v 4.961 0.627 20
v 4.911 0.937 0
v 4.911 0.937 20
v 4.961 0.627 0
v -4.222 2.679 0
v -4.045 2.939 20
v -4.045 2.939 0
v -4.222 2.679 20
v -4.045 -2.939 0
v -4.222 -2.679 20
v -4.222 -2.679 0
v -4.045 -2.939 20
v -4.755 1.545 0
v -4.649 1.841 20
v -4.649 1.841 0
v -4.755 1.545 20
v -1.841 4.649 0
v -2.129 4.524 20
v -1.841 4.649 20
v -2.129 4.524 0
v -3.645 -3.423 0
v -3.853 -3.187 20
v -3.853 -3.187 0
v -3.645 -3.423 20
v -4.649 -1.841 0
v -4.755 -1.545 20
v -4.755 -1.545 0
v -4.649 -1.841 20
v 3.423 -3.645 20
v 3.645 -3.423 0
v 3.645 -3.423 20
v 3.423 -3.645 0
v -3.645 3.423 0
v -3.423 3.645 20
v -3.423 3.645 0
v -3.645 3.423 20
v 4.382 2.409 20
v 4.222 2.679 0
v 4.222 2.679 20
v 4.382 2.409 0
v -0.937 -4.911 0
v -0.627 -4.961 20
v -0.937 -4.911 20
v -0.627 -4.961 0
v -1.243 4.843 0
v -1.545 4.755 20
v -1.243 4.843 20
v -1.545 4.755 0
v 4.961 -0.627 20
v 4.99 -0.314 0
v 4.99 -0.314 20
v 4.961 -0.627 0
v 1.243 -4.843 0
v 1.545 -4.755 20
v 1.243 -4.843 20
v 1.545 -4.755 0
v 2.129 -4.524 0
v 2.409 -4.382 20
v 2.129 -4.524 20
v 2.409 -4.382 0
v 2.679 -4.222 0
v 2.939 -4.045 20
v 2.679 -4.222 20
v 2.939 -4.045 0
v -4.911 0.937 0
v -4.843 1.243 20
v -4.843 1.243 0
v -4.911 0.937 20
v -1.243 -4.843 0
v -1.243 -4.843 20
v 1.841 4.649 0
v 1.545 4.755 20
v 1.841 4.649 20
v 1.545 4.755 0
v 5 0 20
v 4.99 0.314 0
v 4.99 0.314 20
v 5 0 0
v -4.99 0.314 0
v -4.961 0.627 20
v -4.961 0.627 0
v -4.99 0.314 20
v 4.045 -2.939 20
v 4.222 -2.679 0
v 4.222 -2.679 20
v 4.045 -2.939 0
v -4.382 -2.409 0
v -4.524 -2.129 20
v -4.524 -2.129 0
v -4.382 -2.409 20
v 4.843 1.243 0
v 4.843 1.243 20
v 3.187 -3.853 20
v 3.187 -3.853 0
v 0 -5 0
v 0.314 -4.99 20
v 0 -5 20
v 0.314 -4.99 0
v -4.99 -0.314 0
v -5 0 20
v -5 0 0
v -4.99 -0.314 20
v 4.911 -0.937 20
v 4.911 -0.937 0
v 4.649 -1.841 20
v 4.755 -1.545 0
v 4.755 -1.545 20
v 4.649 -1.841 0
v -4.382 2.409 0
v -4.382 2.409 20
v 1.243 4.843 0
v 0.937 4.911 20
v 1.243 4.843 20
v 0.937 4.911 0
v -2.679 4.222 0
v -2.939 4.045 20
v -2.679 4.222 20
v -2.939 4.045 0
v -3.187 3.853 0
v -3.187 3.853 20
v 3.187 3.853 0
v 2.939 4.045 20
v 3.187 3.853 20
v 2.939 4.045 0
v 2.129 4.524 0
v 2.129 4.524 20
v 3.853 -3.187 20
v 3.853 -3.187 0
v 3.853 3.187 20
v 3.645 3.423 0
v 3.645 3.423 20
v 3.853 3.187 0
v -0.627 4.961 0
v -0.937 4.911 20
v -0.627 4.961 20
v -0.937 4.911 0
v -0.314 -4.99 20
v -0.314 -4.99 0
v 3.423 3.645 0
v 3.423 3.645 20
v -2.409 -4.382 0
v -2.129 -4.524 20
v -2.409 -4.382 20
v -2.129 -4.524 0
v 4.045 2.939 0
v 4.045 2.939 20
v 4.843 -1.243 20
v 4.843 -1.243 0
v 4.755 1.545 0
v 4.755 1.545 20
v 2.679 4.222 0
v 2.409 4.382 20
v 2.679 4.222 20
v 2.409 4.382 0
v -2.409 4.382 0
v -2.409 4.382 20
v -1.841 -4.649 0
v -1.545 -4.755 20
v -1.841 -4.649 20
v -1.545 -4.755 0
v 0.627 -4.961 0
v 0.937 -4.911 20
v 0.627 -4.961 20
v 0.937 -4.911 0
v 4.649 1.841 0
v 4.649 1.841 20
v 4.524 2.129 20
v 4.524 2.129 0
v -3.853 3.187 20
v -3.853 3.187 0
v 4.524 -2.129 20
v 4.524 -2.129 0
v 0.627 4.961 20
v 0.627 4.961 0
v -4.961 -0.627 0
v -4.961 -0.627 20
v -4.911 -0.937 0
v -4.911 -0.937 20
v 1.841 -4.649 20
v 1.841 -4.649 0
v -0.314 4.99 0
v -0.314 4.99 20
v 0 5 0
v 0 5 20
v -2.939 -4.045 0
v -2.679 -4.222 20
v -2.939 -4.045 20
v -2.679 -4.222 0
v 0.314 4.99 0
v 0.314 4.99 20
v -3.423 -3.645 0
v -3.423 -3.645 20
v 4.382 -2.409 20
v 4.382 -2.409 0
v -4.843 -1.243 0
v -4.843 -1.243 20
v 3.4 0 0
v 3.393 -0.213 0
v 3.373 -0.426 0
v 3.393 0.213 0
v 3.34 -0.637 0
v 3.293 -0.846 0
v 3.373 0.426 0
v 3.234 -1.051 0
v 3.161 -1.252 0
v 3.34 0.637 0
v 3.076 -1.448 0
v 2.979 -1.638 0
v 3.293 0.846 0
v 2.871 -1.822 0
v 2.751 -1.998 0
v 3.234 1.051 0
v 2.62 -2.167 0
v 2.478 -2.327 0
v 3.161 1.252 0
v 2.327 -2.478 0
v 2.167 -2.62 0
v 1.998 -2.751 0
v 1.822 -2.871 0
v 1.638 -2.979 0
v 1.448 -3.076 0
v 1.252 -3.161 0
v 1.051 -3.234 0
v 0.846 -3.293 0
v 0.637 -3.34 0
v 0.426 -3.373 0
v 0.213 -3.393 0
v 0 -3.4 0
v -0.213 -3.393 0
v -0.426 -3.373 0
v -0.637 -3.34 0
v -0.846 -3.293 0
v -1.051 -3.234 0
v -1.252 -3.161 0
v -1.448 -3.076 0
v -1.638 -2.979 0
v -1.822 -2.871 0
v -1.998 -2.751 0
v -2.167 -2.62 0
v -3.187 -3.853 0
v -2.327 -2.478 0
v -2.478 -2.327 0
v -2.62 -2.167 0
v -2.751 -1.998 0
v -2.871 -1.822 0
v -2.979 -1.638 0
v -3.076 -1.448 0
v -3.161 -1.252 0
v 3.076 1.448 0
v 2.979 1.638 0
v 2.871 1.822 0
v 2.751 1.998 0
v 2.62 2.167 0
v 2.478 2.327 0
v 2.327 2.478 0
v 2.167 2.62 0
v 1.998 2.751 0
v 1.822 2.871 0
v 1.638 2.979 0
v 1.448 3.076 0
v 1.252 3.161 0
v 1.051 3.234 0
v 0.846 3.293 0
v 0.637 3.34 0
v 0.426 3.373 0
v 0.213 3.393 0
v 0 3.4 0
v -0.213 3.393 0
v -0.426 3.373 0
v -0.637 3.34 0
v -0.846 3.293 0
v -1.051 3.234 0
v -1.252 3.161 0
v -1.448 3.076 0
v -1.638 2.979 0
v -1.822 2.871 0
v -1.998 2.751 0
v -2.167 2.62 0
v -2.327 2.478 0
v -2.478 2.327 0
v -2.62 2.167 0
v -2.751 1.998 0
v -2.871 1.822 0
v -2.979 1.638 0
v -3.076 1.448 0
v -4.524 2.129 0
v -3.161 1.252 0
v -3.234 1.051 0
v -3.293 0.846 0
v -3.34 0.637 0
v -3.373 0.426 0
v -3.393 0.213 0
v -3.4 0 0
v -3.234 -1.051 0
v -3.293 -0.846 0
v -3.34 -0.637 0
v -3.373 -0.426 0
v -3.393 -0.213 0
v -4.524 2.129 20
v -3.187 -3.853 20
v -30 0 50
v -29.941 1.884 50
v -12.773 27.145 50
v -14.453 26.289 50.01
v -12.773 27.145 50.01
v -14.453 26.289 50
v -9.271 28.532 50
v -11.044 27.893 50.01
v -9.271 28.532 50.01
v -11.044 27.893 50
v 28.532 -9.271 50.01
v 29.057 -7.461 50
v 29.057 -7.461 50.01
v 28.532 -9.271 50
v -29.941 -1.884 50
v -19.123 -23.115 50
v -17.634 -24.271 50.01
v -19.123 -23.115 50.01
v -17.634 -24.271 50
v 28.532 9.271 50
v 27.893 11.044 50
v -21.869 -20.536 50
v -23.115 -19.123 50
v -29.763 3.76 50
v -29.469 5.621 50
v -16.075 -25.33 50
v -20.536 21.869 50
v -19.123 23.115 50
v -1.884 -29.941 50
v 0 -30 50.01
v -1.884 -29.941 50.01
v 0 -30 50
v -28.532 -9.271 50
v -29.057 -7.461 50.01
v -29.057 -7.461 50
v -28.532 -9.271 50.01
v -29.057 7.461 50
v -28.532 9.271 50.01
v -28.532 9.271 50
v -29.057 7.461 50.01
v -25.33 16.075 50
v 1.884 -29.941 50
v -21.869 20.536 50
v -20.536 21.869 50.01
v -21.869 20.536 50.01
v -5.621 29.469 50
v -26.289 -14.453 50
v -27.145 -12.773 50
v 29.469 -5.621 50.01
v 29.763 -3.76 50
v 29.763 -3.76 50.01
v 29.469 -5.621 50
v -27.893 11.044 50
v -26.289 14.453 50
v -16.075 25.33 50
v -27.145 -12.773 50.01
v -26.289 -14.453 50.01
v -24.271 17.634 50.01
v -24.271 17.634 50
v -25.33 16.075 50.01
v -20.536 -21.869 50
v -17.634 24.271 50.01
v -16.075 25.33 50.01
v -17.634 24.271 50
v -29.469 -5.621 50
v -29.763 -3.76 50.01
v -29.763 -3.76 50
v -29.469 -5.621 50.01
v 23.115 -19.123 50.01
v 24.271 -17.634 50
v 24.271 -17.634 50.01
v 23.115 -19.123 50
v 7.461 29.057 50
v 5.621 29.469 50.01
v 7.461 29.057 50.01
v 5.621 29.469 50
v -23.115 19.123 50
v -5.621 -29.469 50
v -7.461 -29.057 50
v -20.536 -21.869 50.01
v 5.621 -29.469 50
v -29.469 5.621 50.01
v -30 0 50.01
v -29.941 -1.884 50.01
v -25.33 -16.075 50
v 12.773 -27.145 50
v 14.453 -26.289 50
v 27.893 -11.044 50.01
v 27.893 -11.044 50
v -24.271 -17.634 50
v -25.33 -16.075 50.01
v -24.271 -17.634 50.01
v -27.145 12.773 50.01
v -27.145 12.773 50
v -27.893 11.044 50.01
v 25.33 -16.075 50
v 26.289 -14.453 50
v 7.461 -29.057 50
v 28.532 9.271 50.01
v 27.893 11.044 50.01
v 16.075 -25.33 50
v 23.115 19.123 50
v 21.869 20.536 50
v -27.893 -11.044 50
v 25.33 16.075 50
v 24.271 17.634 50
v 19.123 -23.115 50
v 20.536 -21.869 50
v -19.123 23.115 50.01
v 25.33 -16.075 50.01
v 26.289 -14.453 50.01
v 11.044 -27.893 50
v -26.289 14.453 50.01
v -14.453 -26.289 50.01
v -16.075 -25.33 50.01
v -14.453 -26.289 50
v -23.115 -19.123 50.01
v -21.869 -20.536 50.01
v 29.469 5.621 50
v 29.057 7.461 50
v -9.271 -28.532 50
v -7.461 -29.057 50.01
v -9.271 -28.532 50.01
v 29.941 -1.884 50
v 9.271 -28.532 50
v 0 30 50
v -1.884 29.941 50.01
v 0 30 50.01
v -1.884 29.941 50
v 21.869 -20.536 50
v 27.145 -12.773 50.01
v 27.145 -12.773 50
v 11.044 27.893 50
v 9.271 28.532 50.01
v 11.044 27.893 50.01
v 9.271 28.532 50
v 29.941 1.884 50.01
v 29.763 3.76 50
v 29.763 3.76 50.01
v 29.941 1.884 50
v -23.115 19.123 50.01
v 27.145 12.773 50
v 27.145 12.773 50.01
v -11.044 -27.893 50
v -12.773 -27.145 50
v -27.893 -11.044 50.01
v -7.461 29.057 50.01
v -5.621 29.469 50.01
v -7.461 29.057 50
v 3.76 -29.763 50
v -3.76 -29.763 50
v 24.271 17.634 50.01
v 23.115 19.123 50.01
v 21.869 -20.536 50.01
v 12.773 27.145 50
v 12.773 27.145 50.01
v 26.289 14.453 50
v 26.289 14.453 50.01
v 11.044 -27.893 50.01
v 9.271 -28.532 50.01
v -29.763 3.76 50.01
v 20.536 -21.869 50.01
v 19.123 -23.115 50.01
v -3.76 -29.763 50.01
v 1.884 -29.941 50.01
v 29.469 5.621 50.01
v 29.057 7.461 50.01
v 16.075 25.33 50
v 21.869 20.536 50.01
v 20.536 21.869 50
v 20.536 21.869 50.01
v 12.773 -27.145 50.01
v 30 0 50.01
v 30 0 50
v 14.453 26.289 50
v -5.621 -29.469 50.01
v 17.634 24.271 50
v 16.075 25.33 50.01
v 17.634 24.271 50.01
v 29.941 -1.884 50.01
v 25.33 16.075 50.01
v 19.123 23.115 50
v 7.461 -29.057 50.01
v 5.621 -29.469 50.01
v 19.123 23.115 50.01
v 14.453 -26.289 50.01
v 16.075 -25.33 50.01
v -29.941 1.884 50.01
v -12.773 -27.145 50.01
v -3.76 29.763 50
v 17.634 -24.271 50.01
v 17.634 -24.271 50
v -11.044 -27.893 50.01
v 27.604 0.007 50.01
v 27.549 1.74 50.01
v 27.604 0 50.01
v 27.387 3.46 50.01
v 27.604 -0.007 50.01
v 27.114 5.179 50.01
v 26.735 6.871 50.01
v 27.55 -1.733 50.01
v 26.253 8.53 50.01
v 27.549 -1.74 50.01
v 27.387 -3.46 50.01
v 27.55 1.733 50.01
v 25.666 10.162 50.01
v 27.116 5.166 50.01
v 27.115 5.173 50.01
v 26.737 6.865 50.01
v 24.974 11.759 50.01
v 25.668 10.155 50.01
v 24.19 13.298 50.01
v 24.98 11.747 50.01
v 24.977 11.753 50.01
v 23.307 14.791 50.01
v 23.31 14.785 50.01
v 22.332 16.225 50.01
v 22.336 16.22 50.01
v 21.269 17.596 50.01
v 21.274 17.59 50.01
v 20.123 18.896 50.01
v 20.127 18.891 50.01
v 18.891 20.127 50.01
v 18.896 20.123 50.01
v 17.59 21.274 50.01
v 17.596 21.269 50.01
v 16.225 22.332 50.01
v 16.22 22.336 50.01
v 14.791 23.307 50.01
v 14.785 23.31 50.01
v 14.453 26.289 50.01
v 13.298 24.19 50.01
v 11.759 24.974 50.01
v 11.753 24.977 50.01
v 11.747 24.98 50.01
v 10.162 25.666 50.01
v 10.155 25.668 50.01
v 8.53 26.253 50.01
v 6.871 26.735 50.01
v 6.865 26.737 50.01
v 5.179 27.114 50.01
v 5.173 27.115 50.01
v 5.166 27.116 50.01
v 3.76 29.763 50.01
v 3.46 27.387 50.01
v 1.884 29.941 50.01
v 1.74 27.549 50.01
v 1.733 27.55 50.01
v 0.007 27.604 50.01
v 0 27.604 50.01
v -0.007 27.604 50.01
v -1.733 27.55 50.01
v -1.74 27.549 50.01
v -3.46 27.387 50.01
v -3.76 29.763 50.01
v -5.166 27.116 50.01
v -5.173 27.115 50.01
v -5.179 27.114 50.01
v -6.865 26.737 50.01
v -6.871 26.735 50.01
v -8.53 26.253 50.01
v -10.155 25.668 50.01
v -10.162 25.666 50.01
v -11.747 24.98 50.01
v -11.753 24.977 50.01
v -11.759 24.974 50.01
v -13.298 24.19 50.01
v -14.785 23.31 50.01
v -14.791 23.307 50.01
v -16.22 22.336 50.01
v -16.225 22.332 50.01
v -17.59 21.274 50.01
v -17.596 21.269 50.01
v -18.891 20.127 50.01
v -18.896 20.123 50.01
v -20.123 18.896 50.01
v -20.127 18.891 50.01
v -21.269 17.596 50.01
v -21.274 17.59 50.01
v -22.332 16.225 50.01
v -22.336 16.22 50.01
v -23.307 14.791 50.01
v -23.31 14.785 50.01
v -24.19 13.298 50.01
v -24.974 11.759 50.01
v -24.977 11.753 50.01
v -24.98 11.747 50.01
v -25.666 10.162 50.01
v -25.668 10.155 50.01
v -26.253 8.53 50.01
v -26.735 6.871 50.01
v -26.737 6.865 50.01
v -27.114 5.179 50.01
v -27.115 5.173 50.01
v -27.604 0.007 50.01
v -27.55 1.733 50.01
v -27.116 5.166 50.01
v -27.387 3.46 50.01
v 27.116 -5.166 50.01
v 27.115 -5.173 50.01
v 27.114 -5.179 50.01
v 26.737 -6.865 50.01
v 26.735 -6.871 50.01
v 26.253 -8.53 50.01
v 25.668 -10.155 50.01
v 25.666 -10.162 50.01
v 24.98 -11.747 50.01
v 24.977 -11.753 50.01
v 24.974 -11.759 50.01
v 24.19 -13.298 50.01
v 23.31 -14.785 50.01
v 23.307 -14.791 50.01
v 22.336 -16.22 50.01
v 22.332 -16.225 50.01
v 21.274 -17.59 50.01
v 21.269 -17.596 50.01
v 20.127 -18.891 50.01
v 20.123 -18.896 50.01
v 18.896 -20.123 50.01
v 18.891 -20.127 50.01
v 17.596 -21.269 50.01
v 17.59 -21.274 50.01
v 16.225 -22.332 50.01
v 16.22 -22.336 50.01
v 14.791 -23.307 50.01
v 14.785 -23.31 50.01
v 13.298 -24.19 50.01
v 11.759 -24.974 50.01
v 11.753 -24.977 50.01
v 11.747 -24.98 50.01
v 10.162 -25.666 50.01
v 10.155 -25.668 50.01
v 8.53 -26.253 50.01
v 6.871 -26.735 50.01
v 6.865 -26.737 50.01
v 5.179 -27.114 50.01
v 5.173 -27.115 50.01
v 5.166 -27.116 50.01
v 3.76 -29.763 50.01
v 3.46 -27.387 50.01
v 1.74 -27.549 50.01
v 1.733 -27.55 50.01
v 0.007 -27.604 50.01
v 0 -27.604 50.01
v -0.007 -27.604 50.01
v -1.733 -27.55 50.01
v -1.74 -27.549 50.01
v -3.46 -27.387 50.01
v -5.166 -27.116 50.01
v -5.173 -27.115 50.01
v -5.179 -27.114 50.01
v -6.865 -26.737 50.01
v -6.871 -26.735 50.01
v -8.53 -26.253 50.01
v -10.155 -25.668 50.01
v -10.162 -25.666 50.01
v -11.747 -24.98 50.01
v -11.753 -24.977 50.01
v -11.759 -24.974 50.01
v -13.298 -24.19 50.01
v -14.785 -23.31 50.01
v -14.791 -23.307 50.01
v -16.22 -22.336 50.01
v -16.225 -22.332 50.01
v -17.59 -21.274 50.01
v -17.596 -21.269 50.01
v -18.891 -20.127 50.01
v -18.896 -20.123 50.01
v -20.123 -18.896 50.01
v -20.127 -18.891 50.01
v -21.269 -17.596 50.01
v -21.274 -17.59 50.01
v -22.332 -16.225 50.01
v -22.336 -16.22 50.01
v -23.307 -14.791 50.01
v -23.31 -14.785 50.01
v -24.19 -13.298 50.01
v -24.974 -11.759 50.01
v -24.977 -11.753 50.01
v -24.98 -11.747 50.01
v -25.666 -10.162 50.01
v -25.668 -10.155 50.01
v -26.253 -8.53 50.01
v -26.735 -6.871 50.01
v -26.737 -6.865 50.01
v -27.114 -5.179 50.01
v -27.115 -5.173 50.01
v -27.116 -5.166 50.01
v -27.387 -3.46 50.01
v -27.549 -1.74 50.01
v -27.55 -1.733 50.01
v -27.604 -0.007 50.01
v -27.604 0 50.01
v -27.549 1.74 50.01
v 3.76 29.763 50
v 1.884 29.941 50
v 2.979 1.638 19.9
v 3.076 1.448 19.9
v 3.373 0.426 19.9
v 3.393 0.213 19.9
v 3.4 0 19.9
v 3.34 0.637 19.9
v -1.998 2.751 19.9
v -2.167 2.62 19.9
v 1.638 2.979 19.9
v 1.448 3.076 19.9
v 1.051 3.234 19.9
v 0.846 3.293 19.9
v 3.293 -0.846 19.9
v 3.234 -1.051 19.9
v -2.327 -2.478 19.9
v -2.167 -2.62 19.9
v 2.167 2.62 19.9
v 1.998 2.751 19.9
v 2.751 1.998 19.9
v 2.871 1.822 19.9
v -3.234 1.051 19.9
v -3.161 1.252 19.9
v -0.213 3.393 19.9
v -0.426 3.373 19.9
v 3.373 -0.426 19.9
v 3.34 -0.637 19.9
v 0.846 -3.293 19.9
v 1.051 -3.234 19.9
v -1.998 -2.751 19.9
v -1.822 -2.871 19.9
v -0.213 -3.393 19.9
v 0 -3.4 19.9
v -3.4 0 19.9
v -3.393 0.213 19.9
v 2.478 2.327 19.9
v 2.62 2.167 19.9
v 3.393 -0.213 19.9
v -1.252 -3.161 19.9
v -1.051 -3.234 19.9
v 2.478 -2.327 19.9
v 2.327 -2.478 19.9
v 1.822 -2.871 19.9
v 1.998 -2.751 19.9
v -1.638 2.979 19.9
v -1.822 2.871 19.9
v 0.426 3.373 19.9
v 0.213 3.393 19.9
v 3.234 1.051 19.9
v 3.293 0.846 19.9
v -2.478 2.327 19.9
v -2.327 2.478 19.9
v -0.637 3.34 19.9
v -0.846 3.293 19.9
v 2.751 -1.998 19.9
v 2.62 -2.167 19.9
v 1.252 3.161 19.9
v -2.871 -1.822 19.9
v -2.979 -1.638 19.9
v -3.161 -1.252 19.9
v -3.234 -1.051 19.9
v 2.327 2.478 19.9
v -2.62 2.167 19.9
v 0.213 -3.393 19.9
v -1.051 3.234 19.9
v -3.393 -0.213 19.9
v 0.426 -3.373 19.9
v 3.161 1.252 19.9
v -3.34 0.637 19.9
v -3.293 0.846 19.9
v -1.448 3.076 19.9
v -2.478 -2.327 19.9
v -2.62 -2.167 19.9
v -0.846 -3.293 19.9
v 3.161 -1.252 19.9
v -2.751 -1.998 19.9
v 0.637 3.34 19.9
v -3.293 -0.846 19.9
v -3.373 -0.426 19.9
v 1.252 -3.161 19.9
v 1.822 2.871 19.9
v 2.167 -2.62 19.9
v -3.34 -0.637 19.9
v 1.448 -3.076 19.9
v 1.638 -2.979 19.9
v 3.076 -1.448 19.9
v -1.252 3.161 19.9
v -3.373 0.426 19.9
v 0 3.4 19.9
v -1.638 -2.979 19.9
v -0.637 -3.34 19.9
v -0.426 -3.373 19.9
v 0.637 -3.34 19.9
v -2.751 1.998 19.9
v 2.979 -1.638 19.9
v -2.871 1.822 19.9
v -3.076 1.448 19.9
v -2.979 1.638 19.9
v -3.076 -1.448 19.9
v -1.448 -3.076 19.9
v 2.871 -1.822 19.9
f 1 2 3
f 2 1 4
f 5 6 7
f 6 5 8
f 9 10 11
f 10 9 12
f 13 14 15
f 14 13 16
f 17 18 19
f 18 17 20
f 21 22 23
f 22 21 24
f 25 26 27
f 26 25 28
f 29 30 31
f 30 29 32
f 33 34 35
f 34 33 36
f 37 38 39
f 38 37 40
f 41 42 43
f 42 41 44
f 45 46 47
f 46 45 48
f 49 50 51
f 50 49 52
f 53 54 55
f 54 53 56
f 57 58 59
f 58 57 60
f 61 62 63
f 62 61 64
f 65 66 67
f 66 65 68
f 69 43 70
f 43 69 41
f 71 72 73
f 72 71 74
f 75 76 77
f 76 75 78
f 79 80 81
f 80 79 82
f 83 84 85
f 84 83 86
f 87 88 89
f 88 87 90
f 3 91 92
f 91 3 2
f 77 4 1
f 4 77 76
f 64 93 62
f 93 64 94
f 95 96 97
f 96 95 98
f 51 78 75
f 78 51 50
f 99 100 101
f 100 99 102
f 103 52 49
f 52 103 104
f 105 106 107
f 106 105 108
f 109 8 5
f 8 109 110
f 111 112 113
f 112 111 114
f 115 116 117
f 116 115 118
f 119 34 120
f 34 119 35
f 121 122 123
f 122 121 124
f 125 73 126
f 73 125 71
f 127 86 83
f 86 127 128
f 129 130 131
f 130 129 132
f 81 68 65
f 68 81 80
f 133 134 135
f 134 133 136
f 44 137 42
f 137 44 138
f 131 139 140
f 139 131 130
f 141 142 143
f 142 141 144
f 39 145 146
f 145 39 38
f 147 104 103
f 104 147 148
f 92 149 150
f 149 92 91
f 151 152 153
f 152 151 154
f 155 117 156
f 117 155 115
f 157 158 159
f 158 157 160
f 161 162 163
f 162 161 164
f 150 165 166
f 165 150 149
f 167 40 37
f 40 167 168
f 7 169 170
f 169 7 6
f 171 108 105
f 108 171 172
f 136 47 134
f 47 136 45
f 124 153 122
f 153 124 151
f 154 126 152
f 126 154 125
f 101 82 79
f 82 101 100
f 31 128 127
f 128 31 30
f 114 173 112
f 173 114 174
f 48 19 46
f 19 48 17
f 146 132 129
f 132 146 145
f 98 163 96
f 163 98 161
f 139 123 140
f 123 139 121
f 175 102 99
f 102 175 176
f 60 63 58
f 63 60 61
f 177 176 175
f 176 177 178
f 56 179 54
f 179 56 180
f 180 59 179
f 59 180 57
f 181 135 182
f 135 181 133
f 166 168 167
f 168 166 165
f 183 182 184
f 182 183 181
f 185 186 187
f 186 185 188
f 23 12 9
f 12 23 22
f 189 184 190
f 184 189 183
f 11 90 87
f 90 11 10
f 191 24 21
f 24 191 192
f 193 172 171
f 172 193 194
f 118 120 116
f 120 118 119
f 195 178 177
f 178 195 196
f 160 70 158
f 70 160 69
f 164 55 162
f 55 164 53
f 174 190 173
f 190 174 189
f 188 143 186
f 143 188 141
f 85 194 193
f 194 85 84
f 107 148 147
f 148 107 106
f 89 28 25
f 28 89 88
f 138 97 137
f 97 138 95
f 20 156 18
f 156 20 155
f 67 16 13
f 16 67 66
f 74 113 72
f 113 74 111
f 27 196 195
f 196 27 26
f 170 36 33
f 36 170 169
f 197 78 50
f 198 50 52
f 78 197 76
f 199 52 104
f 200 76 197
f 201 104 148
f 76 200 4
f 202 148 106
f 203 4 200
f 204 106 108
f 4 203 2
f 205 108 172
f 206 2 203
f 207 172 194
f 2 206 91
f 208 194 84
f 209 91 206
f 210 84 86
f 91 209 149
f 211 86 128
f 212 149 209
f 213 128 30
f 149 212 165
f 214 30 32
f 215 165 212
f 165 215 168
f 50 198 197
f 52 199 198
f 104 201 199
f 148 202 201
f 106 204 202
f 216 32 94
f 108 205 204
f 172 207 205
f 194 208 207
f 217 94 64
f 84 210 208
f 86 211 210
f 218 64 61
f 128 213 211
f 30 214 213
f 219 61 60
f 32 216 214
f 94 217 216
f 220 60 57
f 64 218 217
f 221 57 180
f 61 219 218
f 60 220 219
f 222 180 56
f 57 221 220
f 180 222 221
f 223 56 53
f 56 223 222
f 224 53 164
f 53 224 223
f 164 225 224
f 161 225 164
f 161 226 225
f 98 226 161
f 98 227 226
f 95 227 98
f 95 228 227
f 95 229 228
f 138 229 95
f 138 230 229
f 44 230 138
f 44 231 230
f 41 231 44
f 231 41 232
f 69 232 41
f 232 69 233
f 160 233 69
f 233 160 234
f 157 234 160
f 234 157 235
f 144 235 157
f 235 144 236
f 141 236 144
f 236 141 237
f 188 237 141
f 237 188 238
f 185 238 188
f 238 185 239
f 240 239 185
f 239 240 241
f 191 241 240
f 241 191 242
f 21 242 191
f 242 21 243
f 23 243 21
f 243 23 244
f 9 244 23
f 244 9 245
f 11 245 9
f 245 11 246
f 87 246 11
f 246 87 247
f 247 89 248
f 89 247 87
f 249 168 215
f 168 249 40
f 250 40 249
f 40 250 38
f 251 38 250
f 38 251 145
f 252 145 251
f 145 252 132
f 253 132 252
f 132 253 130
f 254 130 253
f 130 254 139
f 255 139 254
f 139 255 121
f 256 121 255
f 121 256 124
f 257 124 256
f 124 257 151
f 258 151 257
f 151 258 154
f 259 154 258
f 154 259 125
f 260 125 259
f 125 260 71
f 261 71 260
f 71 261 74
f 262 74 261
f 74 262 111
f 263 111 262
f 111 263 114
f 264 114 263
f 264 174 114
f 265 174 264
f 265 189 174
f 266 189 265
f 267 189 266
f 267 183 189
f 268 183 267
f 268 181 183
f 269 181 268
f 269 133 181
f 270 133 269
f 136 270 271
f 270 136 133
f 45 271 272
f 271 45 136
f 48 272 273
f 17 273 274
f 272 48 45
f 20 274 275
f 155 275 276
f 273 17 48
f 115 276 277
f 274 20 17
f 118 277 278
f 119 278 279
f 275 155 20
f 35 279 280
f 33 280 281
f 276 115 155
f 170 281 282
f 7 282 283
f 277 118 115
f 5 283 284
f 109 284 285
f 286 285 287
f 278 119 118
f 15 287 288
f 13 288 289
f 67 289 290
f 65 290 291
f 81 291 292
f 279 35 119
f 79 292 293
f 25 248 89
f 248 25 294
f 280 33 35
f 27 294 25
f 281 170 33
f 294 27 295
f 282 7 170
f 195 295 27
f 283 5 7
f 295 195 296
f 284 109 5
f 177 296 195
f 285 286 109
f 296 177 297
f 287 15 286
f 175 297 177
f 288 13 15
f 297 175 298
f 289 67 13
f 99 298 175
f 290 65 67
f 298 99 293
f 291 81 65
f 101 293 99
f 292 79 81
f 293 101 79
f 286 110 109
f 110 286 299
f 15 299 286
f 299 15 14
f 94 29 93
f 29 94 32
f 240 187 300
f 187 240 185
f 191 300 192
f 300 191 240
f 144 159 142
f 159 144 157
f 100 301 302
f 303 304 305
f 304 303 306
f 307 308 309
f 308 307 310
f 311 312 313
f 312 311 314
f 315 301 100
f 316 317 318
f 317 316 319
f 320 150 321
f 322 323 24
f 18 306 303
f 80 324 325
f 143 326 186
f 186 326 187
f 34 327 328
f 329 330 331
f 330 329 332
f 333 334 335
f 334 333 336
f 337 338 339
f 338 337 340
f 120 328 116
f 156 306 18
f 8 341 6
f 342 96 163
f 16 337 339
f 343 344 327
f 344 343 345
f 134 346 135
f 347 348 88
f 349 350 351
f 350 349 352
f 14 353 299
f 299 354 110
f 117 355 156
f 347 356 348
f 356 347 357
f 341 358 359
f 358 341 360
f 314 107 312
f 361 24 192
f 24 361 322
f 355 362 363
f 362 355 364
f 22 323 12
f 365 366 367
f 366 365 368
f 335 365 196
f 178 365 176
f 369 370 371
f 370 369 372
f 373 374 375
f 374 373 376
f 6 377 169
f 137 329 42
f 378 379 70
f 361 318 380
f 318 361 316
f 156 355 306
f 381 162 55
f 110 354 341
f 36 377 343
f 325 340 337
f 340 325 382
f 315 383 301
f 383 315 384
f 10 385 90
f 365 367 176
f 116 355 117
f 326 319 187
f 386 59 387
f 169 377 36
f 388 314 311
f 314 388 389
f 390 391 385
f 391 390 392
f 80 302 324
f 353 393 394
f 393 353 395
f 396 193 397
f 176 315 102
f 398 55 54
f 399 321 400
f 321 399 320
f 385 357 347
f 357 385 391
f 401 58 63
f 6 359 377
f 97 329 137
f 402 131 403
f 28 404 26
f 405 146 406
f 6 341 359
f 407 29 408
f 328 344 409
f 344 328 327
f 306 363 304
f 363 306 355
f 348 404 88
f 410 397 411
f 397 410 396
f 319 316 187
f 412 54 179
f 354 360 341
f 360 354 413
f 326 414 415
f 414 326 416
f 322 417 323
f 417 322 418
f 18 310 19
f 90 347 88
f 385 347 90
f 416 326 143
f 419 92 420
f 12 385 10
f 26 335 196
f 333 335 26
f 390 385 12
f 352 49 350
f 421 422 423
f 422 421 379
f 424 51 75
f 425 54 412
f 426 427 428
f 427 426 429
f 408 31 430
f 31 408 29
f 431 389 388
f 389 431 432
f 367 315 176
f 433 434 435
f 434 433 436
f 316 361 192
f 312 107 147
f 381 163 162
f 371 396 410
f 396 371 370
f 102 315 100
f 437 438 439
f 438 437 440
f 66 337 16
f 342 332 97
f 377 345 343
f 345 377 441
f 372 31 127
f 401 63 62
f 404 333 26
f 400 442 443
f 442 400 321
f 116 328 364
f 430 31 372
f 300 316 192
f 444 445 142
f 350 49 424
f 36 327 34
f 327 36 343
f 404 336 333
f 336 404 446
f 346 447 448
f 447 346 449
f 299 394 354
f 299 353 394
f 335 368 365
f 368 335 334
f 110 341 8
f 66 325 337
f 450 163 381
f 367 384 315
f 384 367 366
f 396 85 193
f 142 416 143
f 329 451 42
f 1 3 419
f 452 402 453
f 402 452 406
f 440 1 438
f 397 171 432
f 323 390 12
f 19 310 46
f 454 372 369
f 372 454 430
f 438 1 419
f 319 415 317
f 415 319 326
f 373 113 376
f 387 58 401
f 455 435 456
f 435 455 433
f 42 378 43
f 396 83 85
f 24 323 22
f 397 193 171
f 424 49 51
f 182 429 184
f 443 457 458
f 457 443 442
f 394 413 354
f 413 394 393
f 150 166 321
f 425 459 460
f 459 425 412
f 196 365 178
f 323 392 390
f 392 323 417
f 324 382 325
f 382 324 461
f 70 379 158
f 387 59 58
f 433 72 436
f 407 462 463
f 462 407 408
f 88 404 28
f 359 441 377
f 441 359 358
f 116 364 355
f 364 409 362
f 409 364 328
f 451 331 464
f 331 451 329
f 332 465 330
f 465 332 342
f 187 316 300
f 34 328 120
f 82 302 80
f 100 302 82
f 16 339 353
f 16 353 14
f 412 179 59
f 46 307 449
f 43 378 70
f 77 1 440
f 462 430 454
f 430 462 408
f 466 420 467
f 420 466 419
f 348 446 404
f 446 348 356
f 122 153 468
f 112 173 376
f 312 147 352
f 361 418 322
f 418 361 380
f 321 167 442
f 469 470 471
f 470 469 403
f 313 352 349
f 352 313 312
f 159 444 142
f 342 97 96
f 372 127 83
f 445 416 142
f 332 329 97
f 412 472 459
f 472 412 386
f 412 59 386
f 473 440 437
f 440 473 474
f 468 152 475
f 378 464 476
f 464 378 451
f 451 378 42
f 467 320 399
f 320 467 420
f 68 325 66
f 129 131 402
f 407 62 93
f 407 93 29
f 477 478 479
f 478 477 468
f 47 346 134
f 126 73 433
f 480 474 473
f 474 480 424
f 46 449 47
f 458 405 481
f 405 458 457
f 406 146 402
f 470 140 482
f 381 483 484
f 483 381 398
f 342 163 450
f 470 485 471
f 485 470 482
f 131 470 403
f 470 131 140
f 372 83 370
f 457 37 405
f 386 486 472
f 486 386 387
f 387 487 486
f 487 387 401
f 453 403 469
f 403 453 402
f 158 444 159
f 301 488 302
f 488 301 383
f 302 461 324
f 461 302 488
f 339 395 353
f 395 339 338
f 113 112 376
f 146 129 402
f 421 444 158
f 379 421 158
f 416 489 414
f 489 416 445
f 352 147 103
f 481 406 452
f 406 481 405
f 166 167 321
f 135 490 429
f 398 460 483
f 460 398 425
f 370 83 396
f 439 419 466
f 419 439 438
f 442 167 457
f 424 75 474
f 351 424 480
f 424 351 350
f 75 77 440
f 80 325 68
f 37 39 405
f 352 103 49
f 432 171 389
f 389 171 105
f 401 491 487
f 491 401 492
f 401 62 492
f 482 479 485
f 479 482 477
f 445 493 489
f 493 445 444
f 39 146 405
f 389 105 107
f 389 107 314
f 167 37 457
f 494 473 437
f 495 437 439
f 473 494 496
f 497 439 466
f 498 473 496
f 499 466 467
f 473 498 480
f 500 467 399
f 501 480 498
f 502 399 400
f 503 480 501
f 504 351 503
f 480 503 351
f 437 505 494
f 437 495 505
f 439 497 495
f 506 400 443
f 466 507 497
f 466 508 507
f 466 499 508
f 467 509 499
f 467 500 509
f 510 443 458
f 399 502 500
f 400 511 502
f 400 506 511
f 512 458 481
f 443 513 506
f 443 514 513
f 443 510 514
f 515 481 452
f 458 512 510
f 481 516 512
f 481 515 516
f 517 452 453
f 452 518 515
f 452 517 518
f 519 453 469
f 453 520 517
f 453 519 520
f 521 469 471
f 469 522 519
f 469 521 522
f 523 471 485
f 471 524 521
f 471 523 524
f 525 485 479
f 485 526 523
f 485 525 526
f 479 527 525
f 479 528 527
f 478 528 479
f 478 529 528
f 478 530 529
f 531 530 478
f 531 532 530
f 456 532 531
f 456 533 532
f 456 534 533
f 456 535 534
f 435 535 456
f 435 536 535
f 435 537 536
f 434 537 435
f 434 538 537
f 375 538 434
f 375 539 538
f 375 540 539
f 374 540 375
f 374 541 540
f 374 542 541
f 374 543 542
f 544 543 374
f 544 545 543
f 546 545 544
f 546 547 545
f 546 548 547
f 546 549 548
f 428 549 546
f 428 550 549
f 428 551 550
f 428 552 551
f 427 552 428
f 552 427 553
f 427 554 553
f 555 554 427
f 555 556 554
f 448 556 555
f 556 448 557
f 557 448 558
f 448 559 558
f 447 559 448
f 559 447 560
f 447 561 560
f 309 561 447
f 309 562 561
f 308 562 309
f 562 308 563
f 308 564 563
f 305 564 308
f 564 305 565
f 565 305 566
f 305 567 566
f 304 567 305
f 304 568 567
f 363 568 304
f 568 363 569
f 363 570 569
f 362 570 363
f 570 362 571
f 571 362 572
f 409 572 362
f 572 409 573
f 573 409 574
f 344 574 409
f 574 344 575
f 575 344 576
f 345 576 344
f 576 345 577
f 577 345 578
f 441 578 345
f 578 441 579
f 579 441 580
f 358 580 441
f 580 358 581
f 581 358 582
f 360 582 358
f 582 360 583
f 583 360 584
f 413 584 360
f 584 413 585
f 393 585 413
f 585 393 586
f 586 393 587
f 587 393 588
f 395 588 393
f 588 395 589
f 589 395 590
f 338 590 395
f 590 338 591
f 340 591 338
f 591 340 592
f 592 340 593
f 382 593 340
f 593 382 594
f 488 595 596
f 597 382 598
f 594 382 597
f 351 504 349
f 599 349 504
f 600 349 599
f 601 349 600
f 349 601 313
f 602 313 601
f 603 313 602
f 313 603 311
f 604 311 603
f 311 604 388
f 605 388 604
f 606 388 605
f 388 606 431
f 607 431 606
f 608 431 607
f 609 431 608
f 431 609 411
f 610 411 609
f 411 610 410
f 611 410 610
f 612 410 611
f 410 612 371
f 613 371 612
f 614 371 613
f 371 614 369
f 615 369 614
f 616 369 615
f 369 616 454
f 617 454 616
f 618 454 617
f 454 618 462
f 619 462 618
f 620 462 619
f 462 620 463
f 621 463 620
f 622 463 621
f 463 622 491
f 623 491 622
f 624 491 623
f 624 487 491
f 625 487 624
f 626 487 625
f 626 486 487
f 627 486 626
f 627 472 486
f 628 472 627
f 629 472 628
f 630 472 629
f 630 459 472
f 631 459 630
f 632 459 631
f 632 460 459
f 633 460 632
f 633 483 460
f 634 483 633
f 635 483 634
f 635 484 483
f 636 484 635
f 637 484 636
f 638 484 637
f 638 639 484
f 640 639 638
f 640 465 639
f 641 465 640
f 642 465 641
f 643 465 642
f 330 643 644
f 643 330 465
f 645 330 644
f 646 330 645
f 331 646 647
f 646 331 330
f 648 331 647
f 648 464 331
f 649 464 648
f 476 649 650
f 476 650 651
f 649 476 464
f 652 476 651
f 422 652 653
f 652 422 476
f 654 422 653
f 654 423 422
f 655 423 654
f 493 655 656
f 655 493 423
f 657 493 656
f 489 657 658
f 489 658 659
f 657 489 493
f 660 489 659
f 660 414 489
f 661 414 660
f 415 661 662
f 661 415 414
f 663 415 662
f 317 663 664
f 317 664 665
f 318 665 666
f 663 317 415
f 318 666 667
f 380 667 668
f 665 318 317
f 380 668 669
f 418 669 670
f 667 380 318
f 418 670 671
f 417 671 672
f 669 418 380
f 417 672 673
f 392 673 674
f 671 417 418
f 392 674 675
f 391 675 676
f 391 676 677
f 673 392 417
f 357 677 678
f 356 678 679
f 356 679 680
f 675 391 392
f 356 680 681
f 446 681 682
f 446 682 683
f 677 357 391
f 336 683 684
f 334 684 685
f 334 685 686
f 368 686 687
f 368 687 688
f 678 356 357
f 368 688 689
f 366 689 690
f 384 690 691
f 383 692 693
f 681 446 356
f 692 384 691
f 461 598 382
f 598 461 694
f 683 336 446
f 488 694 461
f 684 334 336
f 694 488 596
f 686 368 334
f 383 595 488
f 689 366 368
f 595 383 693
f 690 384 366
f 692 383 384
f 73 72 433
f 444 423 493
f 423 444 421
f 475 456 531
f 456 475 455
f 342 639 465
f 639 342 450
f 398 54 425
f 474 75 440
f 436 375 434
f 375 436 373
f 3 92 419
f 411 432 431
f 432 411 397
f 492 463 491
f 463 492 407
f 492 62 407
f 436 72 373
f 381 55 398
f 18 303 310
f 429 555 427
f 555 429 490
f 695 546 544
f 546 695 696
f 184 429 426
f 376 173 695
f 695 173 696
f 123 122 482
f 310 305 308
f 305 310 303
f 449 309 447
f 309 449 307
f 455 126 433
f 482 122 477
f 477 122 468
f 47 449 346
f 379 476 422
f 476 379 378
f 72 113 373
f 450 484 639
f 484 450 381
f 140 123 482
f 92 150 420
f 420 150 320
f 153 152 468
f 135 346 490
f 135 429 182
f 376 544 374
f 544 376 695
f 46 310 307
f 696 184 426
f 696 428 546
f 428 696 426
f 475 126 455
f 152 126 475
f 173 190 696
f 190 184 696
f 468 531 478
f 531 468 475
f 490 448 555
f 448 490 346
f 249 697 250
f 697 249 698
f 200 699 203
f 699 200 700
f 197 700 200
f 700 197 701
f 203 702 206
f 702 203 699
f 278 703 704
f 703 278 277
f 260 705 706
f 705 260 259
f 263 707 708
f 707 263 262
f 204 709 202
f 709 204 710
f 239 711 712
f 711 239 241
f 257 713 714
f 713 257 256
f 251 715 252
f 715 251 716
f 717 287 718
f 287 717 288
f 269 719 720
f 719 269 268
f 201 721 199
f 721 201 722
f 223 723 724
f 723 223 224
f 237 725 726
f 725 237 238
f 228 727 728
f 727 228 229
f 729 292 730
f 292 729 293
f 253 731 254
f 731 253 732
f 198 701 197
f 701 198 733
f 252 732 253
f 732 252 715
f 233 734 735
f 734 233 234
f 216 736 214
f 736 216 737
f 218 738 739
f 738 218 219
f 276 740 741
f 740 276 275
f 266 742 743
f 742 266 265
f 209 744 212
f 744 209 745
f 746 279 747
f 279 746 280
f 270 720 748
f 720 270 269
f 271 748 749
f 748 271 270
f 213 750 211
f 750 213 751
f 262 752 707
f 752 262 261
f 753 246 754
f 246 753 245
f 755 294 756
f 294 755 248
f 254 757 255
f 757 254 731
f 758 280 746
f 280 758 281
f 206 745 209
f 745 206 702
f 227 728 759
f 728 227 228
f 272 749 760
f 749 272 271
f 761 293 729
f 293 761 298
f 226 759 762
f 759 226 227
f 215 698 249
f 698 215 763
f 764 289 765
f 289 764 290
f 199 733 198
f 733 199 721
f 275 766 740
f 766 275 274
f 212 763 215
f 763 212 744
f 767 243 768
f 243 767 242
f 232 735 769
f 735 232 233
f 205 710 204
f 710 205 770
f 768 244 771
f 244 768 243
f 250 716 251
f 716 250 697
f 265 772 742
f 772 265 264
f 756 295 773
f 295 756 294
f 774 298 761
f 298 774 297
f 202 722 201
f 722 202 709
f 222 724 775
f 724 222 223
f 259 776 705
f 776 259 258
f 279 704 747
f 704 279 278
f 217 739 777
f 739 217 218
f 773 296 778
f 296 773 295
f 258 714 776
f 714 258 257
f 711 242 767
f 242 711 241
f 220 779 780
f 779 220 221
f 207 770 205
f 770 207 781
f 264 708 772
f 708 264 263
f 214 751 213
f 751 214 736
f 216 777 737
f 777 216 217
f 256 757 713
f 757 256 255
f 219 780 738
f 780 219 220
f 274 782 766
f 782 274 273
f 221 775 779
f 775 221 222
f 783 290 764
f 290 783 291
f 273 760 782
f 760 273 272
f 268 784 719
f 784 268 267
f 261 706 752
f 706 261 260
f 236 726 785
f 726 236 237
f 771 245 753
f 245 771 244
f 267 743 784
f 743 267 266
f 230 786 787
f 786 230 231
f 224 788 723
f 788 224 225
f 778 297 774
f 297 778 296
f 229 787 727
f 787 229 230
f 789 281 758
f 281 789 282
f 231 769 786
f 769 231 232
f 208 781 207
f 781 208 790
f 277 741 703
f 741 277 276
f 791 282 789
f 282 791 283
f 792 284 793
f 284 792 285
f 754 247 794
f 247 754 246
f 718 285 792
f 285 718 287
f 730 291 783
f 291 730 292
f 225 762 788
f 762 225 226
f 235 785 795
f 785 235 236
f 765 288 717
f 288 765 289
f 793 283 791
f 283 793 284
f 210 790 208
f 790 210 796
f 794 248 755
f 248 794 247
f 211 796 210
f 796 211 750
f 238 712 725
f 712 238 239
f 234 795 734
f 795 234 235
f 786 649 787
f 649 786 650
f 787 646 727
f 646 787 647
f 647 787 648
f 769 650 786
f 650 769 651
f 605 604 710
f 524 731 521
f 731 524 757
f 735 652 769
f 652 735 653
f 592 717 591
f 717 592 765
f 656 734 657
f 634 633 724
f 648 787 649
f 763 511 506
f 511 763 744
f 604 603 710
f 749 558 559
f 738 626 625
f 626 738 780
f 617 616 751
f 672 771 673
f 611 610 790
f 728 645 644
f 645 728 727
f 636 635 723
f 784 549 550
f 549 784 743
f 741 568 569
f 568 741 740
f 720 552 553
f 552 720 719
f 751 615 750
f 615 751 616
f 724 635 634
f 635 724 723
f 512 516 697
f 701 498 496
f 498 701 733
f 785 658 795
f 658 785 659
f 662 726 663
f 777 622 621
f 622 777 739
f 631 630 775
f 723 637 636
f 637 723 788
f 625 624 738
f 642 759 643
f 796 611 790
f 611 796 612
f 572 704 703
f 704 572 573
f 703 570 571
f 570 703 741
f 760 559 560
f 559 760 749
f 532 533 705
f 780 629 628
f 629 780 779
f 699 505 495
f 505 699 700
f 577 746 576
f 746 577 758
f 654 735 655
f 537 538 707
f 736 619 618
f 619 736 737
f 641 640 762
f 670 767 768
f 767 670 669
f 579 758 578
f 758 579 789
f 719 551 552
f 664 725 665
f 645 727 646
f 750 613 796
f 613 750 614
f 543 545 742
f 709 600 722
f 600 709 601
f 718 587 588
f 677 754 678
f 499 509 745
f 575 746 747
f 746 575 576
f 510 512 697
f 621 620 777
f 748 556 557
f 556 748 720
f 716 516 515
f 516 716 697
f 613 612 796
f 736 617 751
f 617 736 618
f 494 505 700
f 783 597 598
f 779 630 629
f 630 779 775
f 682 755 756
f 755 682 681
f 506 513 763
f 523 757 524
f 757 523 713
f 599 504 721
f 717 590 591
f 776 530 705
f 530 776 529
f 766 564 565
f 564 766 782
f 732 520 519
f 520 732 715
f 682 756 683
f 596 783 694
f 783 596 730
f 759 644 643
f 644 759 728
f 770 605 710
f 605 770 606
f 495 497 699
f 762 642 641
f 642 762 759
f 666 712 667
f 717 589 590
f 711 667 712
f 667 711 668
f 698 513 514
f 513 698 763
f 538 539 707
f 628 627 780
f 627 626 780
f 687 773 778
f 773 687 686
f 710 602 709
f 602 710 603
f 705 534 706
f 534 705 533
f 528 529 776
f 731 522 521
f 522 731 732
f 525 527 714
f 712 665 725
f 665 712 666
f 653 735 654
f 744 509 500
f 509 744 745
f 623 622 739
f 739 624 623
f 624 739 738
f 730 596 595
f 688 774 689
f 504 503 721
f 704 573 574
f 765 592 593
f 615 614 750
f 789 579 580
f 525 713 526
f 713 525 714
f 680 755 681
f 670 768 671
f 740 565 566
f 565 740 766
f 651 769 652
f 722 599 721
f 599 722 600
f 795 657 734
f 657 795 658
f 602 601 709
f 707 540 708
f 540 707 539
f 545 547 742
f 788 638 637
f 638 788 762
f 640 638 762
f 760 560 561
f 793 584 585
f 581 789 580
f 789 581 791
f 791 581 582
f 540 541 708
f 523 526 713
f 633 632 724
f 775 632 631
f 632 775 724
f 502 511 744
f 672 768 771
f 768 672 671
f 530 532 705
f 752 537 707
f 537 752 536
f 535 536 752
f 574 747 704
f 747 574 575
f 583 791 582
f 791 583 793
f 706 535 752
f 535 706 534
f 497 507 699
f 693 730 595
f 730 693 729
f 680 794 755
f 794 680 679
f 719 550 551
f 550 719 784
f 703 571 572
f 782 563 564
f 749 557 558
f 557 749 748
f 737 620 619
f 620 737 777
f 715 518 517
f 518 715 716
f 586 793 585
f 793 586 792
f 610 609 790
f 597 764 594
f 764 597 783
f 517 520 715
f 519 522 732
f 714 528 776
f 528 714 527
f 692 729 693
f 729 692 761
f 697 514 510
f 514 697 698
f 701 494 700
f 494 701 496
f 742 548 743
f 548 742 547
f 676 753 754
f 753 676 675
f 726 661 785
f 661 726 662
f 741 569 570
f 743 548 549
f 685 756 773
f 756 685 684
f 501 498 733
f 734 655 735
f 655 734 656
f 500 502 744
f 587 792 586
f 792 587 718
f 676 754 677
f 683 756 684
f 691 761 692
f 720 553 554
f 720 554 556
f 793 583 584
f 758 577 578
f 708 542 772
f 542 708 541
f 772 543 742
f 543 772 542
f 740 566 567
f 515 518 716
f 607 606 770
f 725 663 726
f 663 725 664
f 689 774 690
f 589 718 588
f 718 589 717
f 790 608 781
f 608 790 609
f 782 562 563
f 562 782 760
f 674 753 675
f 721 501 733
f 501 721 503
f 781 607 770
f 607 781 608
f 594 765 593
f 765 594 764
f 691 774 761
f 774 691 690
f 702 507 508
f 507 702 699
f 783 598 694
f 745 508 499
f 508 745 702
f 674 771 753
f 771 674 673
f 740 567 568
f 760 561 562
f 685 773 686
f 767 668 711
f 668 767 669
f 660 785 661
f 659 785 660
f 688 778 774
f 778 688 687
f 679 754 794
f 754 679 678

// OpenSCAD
// --- Dimensions (mm) ---
spout_od = 10.0;          // Outer diameter of the spout
spout_height = 20.0;      // Height of the spout section (Z=0 to Z=20)
funnel_rim_od = 60.0;     // Outer diameter at the top rim (Z=50)
funnel_height = 50.0;     // Total height from base to rim
wall_thickness = 1.6;     // Uniform wall thickness
$fn = 100;                // Smoothness for curves

// --- Derived Dimensions ---
spout_id = spout_od - (2 * wall_thickness); // 6.8 mm
funnel_id_top = funnel_rim_od - (2 * wall_thickness); // 56.8 mm

// --- Construction Logic ---
// The previous report showed "2 separate bodies", meaning the inner void 
// was not properly subtracting from the outer shell at the transition point.
// This version uses a single difference() block to ensure a single watertight manifold.

difference() {
    // 1. OUTER VOLUME
    union() {
        // Spout: Straight cylinder from Z=0 to Z=20
        cylinder(h = spout_height, d = spout_od);
        
        // Funnel: Cone from Z=20 to Z=50
        // We use hull to ensure a smooth transition from the spout top to the rim
        hull() {
            translate([0, 0, spout_height])
                cylinder(h = 0.01, d = spout_od);
            translate([0, 0, funnel_height])
                cylinder(h = 0.01, d = funnel_rim_od);
        }
    }

    // 2. INNER VOID (The hollow part)
    // We subtract the entire internal cavity from the outer volume
    union() {
        // Spout bore: Z=0 to Z=20 (extended to ensure clean cut at bottom)
        translate([0, 0, -1])
            cylinder(h = spout_height + 2, d = spout_id);
        
        // Funnel bore: Z=20 to Z=50
        // The inner cone must transition from spout_id at Z=20 to funnel_id_top at Z=50
        hull() {
            translate([0, 0, spout_height - 0.1])
                cylinder(h = 0.2, d = spout_id);
            translate([0, 0, funnel_height + 1])
                cylinder(h = 2, d = funnel_id_top);
        }
    }
}

// Verification of requirements:
// - Spout OD: 10mm (Check)
// - Spout height: 20mm (Check)
// - Funnel rim OD: 60mm (Check)
// - Total height: 50mm (Check)
// - Wall thickness: 1.6mm (Check: 10 - 6.8 = 3.2; 3.2 / 2 = 1.6)
// - Open top and bottom: (Check: via -1 and +1 extensions in difference)
// - Single body: (Check: single difference() block)
